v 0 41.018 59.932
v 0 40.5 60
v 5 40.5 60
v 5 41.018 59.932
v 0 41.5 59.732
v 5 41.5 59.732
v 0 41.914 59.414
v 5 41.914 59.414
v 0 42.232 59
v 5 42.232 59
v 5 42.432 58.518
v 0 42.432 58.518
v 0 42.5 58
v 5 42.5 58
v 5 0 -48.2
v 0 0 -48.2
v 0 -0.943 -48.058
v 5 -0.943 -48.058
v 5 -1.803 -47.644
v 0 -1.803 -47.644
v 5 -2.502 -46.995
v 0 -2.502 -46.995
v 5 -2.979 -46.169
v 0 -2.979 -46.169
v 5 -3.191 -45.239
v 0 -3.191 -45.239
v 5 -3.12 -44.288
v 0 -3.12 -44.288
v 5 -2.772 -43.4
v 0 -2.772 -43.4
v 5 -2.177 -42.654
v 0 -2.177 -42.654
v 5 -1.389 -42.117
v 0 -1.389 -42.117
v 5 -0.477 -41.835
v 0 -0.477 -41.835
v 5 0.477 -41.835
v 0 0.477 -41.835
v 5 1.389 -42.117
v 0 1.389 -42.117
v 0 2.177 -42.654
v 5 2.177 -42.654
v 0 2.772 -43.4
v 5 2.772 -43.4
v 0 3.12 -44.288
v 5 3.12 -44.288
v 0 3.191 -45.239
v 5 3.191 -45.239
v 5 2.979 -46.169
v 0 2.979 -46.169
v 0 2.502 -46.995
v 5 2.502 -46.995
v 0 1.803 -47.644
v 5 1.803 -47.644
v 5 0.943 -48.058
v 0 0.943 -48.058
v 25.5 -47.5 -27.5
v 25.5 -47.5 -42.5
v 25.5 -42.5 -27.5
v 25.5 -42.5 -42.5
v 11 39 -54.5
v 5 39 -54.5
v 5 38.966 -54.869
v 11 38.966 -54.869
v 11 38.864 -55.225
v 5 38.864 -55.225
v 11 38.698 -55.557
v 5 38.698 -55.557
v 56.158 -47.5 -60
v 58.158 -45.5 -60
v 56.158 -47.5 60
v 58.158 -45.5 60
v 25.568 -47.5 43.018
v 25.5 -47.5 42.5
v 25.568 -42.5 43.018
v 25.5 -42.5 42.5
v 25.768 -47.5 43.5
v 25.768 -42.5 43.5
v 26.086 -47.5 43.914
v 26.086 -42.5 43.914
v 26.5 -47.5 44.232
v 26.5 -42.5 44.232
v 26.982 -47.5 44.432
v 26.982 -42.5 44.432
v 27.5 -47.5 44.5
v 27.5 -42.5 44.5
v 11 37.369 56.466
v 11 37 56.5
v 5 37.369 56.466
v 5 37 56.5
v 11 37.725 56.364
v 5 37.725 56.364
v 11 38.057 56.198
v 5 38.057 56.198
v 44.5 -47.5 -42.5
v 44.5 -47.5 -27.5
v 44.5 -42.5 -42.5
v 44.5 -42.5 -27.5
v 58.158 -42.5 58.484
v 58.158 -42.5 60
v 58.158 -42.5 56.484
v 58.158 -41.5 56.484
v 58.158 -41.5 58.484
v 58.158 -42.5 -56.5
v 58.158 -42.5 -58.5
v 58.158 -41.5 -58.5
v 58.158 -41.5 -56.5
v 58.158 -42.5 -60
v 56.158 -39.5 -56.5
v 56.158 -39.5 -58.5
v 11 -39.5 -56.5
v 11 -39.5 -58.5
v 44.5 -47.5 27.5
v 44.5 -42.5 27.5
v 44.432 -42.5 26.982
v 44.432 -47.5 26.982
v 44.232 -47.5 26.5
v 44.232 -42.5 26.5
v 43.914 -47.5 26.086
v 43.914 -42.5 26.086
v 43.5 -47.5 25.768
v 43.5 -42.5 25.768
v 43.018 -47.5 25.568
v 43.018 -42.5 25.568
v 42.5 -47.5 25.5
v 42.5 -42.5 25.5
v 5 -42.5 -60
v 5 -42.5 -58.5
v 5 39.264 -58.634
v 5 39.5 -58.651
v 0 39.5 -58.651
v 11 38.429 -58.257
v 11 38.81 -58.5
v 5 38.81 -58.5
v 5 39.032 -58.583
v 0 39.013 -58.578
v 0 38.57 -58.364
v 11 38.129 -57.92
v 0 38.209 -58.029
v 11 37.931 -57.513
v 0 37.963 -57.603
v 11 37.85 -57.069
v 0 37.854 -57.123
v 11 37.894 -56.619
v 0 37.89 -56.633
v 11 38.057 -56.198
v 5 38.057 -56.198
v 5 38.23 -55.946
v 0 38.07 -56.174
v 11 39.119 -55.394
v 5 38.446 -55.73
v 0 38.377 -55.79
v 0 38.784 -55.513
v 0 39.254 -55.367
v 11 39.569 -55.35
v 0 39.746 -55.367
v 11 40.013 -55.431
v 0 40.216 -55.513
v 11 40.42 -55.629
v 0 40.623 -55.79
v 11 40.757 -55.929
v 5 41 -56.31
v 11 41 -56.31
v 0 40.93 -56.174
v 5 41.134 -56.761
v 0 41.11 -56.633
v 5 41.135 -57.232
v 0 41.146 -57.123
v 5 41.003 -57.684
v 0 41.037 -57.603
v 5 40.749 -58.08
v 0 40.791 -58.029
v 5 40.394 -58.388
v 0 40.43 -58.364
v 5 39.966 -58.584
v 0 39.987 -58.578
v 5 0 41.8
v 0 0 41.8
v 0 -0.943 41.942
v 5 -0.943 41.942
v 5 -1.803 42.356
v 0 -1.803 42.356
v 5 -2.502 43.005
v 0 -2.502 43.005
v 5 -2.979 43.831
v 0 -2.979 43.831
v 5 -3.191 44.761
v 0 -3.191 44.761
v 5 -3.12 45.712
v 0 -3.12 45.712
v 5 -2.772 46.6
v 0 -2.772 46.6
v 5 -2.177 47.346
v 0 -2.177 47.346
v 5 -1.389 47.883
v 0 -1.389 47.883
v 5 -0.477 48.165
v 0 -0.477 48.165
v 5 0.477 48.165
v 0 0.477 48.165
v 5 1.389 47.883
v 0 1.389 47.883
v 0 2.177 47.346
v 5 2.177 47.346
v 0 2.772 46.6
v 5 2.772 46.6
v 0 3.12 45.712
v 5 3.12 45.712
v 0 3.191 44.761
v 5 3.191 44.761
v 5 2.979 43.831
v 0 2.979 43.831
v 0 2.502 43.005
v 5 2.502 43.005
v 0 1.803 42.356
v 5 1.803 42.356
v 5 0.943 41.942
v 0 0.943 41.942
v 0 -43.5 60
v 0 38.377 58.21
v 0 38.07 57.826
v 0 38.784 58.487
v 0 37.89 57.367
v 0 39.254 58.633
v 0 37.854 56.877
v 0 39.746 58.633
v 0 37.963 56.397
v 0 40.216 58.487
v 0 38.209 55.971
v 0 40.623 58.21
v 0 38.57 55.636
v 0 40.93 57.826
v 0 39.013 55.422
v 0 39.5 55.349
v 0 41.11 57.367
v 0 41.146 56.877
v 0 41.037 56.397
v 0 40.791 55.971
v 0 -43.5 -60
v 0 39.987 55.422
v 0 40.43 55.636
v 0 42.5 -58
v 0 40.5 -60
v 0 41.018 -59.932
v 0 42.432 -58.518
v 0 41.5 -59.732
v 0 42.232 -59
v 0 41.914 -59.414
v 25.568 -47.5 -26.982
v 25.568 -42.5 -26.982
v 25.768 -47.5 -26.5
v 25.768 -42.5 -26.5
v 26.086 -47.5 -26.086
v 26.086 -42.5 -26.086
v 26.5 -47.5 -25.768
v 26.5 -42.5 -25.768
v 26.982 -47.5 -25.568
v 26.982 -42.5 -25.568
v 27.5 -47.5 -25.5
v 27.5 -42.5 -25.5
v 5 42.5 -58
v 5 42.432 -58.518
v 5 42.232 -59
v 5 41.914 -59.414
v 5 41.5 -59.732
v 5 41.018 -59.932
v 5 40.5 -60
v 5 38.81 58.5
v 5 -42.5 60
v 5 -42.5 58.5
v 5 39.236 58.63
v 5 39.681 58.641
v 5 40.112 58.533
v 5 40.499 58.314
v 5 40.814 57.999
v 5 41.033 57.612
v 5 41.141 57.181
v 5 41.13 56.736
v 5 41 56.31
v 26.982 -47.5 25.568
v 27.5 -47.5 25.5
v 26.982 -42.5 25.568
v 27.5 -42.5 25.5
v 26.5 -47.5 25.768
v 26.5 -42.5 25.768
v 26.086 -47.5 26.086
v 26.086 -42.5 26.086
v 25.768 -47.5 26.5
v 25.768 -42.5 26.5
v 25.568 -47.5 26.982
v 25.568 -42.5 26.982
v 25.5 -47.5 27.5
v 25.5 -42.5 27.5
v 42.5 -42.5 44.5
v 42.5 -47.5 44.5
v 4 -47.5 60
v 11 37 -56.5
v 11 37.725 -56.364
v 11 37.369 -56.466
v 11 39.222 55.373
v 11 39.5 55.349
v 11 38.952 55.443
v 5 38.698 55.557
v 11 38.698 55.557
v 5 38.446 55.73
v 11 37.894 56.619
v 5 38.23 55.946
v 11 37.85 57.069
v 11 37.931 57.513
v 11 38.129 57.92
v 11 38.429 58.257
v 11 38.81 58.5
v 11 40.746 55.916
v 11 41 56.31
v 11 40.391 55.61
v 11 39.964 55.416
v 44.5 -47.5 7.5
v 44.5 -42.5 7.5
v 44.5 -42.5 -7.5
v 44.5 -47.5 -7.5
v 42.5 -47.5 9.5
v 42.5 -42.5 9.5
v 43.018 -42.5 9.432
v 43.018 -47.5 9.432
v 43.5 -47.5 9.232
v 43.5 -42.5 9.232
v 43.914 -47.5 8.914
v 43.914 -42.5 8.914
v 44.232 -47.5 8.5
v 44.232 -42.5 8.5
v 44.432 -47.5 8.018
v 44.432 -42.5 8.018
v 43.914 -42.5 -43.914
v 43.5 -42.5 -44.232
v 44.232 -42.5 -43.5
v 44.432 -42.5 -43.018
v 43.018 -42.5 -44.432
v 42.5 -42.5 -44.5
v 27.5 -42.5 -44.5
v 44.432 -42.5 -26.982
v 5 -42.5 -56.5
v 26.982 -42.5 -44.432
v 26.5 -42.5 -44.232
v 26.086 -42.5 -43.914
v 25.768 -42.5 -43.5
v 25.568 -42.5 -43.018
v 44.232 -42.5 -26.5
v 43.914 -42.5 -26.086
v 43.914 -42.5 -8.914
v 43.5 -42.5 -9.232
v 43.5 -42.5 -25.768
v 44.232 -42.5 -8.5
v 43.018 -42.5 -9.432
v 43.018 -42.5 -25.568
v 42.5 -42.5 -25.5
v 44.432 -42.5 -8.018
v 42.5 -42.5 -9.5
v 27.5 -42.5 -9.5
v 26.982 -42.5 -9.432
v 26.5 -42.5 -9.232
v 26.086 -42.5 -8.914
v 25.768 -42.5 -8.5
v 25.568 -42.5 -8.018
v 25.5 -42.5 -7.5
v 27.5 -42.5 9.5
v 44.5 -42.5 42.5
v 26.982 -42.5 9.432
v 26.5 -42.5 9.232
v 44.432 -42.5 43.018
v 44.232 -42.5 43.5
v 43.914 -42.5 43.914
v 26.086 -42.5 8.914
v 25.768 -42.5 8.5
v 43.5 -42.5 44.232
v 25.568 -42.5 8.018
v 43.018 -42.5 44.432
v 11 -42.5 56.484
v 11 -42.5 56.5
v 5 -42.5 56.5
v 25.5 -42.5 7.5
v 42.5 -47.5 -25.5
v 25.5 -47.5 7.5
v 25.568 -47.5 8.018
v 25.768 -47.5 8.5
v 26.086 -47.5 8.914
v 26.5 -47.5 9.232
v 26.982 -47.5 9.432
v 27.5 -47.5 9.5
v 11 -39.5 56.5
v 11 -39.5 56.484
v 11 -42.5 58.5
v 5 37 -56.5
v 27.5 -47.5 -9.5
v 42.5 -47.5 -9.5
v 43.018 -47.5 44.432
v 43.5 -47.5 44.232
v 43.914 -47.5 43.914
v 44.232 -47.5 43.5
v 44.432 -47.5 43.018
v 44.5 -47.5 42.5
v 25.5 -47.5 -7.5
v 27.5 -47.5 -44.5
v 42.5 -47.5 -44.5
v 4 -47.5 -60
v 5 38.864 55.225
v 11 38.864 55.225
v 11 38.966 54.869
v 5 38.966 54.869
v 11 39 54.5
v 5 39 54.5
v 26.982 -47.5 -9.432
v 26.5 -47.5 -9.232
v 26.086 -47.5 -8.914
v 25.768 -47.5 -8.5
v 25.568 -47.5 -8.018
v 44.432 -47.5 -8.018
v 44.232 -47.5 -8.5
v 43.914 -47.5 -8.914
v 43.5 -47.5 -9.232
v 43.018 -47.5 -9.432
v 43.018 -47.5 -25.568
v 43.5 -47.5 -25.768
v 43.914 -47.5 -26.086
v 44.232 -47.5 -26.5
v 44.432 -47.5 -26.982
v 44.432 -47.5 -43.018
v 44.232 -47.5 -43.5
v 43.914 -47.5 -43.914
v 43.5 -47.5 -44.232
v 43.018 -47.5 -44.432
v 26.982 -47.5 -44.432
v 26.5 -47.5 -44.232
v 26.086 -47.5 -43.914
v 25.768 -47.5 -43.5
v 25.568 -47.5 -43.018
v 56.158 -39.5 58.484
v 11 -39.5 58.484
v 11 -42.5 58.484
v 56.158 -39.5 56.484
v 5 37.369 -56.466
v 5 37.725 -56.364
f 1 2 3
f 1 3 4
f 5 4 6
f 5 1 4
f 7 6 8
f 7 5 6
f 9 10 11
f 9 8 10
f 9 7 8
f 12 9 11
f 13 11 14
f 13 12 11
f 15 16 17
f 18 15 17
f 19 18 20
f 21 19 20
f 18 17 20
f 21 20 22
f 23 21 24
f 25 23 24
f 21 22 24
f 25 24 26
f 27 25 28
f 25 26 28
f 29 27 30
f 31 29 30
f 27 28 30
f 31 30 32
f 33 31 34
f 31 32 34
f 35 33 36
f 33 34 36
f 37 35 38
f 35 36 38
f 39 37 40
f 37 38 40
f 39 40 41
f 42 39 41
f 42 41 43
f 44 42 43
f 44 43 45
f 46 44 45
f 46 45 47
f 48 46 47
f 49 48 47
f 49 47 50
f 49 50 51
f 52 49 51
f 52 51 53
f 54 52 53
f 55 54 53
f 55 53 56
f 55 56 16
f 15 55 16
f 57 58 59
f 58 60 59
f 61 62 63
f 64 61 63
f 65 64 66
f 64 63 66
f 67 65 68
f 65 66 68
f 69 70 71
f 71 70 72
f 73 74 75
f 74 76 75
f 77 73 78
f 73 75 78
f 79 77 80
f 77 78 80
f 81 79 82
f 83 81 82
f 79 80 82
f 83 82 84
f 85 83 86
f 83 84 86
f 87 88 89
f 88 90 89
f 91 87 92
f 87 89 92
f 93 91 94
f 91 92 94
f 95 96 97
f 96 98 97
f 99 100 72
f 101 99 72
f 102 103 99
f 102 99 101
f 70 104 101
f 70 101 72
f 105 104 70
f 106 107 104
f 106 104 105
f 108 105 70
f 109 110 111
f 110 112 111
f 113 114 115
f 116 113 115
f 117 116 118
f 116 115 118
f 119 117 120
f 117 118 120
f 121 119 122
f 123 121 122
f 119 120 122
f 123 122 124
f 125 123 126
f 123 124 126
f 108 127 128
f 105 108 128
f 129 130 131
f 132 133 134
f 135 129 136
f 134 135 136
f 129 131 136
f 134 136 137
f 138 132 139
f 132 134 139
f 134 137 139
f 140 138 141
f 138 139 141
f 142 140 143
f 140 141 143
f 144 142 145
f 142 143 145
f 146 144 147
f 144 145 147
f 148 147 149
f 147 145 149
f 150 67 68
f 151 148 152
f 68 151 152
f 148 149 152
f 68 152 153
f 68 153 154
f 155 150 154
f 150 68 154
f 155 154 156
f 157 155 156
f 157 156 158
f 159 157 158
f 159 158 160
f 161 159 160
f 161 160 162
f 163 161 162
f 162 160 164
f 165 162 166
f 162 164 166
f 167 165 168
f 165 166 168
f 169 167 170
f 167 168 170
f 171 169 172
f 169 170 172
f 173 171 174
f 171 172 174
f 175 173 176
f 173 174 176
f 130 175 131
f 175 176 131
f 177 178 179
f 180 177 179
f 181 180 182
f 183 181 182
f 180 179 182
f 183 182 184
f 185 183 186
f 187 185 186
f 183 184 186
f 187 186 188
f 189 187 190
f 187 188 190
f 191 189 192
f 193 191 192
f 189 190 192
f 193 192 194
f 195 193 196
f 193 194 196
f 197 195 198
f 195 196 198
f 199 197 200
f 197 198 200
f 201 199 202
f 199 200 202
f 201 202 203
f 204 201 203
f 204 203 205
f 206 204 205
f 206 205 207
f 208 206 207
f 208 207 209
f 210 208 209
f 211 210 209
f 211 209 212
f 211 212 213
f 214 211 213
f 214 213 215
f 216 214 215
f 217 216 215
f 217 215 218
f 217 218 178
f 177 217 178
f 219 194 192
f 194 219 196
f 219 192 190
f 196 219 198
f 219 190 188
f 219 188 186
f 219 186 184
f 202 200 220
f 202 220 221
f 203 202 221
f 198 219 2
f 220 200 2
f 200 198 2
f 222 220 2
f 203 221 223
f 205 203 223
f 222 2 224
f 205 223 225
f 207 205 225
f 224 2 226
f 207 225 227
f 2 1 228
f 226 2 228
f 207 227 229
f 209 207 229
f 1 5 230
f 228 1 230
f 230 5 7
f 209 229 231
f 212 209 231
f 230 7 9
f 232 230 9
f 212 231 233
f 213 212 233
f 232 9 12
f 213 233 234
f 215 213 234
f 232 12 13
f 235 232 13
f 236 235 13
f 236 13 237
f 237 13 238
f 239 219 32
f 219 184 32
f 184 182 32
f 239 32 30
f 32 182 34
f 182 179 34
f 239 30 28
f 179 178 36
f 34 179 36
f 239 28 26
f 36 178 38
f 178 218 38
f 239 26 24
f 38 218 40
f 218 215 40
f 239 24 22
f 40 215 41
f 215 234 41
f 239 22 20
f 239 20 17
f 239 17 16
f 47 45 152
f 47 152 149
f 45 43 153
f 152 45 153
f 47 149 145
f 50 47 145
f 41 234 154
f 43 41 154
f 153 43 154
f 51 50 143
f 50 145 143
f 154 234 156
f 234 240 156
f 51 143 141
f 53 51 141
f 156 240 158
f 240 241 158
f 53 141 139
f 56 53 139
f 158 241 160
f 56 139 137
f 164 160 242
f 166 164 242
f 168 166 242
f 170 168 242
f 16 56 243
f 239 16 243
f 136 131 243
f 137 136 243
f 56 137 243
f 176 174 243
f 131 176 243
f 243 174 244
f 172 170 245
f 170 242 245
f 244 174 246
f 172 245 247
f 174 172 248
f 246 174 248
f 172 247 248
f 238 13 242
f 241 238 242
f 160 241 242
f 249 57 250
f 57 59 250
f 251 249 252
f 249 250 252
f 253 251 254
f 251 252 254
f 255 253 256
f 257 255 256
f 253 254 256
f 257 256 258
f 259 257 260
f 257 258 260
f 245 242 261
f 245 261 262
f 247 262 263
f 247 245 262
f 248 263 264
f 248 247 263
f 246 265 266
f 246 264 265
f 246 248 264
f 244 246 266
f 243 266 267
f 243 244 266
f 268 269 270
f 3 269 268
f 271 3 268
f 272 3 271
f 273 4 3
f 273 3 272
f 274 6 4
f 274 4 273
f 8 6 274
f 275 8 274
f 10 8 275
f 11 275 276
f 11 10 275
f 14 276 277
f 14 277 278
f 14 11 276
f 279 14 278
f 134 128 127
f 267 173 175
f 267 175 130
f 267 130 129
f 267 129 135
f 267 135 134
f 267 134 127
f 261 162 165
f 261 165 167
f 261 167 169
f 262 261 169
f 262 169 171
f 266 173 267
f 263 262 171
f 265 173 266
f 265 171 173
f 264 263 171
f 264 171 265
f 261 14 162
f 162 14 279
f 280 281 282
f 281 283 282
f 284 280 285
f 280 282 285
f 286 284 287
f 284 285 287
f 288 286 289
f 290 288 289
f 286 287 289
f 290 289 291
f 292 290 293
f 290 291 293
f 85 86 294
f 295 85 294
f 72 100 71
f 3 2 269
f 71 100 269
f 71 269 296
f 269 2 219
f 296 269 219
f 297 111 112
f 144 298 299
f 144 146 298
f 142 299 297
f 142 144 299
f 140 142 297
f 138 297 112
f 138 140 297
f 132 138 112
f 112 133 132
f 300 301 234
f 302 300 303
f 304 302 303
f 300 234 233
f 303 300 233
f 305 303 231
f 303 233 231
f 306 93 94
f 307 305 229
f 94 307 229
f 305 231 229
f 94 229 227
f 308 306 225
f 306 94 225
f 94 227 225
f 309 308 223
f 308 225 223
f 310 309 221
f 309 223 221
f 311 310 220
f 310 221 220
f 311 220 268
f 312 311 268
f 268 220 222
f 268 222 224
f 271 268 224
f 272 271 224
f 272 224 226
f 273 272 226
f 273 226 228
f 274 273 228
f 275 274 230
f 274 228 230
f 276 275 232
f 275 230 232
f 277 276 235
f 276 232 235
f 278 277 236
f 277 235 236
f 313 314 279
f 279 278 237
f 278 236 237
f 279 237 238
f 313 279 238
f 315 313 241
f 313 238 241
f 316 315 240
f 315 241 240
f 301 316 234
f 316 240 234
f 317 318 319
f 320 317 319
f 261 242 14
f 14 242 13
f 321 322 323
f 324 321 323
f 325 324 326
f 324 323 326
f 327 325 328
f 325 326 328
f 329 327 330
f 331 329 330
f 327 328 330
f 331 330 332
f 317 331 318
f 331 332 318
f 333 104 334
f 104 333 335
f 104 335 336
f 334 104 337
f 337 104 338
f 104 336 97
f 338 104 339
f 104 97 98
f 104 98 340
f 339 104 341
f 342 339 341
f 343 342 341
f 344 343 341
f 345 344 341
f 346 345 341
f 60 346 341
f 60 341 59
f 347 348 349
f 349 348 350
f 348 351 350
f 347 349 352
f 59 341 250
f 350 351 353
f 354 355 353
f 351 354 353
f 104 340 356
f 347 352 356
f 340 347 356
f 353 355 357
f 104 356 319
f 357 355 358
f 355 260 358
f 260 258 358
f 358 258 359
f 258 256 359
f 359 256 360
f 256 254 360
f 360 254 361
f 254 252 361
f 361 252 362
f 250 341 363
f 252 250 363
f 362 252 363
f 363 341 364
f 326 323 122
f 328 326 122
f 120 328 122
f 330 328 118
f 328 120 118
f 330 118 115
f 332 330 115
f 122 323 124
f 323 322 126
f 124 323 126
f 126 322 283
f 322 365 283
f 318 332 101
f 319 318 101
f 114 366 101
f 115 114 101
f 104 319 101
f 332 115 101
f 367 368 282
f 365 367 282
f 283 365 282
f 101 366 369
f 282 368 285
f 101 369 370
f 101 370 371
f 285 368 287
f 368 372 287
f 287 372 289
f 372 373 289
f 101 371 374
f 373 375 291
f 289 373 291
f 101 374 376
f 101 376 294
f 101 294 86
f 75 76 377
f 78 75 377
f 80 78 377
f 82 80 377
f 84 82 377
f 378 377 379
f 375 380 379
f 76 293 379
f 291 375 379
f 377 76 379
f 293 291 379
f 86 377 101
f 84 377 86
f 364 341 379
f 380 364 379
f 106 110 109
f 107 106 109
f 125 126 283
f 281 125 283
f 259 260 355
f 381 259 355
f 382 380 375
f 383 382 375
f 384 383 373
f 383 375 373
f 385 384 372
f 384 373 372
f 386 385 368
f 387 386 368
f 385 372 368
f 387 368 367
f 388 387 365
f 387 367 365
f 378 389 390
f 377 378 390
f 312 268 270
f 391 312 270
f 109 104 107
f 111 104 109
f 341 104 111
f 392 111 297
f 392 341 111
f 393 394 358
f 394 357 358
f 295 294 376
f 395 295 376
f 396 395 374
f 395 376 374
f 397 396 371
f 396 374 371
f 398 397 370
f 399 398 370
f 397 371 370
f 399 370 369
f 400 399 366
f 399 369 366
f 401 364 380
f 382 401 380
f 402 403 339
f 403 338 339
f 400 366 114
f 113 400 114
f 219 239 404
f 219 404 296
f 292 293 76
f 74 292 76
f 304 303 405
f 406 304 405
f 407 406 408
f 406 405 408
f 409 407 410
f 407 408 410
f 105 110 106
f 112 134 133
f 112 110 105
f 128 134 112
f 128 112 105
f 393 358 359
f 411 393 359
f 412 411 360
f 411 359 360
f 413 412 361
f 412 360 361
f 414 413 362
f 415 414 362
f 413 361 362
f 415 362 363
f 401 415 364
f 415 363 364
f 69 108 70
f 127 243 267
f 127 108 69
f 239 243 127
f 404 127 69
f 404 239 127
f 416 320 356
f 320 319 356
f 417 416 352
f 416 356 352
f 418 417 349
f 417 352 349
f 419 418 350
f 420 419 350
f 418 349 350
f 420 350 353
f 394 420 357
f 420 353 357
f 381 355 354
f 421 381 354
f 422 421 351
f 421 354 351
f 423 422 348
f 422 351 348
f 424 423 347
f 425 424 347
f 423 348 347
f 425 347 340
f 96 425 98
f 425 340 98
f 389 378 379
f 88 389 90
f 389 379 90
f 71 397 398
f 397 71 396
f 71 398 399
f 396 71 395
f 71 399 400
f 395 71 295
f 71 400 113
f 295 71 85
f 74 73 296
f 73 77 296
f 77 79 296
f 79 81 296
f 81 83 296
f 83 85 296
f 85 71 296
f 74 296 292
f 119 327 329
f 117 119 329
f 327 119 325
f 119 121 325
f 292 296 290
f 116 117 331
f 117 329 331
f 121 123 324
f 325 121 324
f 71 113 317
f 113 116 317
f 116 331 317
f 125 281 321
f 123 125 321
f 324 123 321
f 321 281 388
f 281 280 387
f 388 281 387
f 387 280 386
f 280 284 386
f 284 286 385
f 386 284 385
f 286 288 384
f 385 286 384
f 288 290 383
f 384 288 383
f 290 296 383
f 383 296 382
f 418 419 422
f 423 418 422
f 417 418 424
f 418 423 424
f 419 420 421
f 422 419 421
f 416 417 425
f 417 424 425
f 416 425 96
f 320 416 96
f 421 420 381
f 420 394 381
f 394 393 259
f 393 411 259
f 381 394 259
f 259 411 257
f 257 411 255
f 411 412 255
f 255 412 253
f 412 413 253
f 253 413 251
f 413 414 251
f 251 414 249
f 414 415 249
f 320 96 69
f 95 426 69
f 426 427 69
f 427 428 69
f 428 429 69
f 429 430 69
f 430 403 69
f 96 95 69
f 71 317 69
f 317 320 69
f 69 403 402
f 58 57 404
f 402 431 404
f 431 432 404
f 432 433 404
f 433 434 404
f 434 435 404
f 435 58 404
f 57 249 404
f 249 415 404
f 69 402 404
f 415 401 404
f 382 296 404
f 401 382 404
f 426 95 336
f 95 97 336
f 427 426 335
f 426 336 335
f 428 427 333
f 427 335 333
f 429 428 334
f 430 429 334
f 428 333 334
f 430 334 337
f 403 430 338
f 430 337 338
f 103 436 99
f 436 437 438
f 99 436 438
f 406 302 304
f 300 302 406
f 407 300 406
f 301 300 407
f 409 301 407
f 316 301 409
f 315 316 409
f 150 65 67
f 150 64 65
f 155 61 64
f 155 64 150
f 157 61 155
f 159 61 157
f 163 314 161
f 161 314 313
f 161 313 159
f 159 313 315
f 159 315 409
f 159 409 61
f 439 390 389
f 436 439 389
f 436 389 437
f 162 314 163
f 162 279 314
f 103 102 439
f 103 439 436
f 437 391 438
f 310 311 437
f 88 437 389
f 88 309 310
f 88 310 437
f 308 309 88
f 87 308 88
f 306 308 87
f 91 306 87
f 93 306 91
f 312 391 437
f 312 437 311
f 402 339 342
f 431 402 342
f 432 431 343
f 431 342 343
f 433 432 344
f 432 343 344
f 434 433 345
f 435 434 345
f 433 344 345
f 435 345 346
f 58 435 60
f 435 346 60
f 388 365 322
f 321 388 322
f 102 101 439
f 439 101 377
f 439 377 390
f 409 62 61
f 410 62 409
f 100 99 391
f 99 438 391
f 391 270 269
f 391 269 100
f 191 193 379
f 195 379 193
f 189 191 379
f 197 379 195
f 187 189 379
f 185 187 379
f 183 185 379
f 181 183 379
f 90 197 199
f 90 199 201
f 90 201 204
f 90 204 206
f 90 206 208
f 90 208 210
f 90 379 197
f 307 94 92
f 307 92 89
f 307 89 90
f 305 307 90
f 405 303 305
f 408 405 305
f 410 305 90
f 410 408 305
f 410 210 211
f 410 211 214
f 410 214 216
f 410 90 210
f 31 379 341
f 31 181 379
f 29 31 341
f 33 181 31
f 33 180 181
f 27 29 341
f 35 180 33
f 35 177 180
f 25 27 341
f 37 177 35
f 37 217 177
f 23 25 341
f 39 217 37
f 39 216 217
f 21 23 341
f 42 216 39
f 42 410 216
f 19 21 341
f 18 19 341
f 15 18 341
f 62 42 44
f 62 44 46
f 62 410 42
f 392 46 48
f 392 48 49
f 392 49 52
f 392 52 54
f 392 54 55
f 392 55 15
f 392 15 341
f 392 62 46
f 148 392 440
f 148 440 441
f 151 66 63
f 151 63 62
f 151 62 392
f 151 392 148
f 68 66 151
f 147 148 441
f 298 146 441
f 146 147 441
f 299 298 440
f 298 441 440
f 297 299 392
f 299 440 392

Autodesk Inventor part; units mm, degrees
ref_plane "YZ Plane" through (0, 0, 0) normal (1, 0, 0) x (0, 1, 0)
ref_plane "XZ Plane" through (0, 0, 0) normal (0, 1, 0) x (-1, 0, 0)
ref_plane "XY Plane" through (0, 0, 0) normal (0, 0, 1) x (1, 0, 0)
sketch "Esboço1" plane through (0, 0, 0) normal (1, 0, 0) x (0, 1, 0)
  line L0 (40.5, 60) -> (-42.5, 60)
  line L1 (-42.5, 60) -> (-42.5, -60)
  line L2 (-42.5, -60) -> (40.5, -60)
  line L3 (42.5, -58) -> (42.5, 58)
  line L4 (-42.5, 60) -> (42.5, -60) construction
  arc A0 (42.5, 58) -> (40.5, 60) centre (40.5, 58) ccw
  arc A1 (40.5, -60) -> (42.5, -58) centre (40.5, -58) ccw
  point P0 (0, 0)
  dimension "d0" = 85
  dimension "d1" = 120
  dimension "d4" = 2
extrude "Extrusão1" add sketch "Esboço1" along normal blind 5
sketch "Esboço2" plane through (5, 0, 0) normal (1, 0, 0) x (0, 0, -1)
  line L0 (-60, 40.5) -> (-60, -42.5) projected
  line L1 (-60, -42.5) -> (-58.5, -42.5)
  line L2 (-60, -42.5) -> (60, -42.5) projected
  line L3 (60, -42.5) -> (58.5, -42.5)
  arc A0 (-58, 42.5) -> (-60, 40.5) centre (-58, 40.5) ccw projected
  line L4 (-58, 42.5) -> (-58, 41)
  line L5 (-58.5, -42.5) -> (-56.5, -42.5)
  line L6 (-56.5, -42.5) -> (-56.5, 37)
  line L7 (-56.5, 41) -> (-56.5, 41)
  line L8 (-58.5, 39) -> (-58.5, -42.5)
  line L9 (58.5, -42.5) -> (56.5, -42.5)
  line L10 (56.5, -42.5) -> (56.5, 37)
  line L11 (56.5, 41) -> (56.5, 41)
  line L12 (58.5, 39) -> (58.5, -42.5)
  line L13 (-56.5, 41) -> (56.5, 41)
  line L14 (54.5, 39) -> (-54.5, 39)
  arc A1 (-56.5, 41) -> (-58.5, 39) centre (-56.5, 39) ccw
  arc A2 (-54.5, 39) -> (-56.5, 37) centre (-54.5, 37) ccw
  arc A3 (58.5, 39) -> (56.5, 41) centre (56.5, 39) ccw
  arc A4 (56.5, 37) -> (54.5, 39) centre (54.5, 37) ccw
  point P0 (0, 0)
  point P1 (-58.5, 41)
  point P2 (58.5, 41)
  dimension "d7" = 1.5
  dimension "d8" = 1.5
  dimension "d9" = 1.5
  dimension "d10" = 2
  dimension "d11" = 2
  dimension "d13" = 2
extrude "Extrusão2" add sketch "Esboço2" along normal blind 6 contours L8 A1 L13 A3 L12 L2 L10 A4 L14 A2 L6
sketch "Esboço3" plane through (11, 0, 0) normal (1, 0, 0) x (0, 0, -1)
  circle A0 centre (-57, 39.5) radius 1.6
  circle A1 centre (57, 39.5) radius 1.6
  point P0 (0, 0)
  dimension "d18" = 3.2
hole "Furo1" at (11, 39.5, 57) direction (-1, 0, 0) diameter 3.302 depth 40 tip angle 118 thread size "8-32 UNC" class "2B" standard "ANSI Unified Screw Threads"
hole "Furo2" at (11, 39.5, -57) direction (-1, 0, 0) diameter 3.302 depth 40 tip angle 118 thread size "8-32 UNC" class "2B" standard "ANSI Unified Screw Threads"
sketch "Esboço4" plane through (5, 0, 0) normal (1, 0, 0) x (0, 0, -1)
  line L0 (-60, -42.5) -> (60, -42.5) projected
  line L1 (-60, -42.5) -> (60, -42.5)
  line L2 (60, -42.5) -> (60, -47.5)
  line L3 (60, -47.5) -> (-60, -47.5)
  line L4 (-60, -47.5) -> (-60, -42.5)
  point P0 (0, 0)
  point P1 (60, -42.5)
  dimension "d33" = 5
extrude "Extrusão3" add sketch "Esboço4" against normal blind 5
sketch "Esboço5" plane through (5, 0, 0) normal (1, 0, 0) x (0, 0, -1)
  line L0 (-60, 40.5) -> (-60, -47.5) projected
  line L1 (60, 40.5) -> (60, -47.5) projected
  line L2 (-60, -47.5) -> (60, -47.5)
  line L3 (60, -47.5) -> (60, -42.5)
  line L4 (60, -42.5) -> (-60, -42.5)
  line L5 (-60, -42.5) -> (-60, -47.5)
  point P0 (0, 0)
  point P1 (60, -47.5)
  dimension "d36" = 5
extrude "Extrusão4" add sketch "Esboço5" along normal blind 53.158
sketch "Esboço6" plane through (11, 0, 0) normal (1, 0, 0) x (0, 0, -1)
  line L0 (60, -42.5) -> (-60, -42.5) projected
  line L1 (-58.4844, -42.5) -> (-56.4844, -42.5)
  line L2 (-56.4844, -42.5) -> (-56.4844, -39.5)
  line L3 (-56.4844, -39.5) -> (-58.4844, -39.5)
  line L4 (-58.4844, -39.5) -> (-58.4844, -42.5)
  line L5 (56.5, 37) -> (56.5, -42.5) projected
  line L6 (58.5, 38.8102) -> (58.5, -42.5) projected
  line L7 (56.5, -42.5) -> (58.5, -42.5)
  line L8 (58.5, -42.5) -> (58.5, -39.5)
  line L9 (58.5, -39.5) -> (56.5, -39.5)
  line L10 (56.5, -39.5) -> (56.5, -42.5)
  point P0 (0, 0)
  dimension "d39" = 2
  dimension "d40" = 3
  dimension "d41" = 3
extrude "Extrusão5" add sketch "Esboço6" along normal blind 47.158
chamfer "Chanfro1" distance 2 angle 45 2 edges at (58.158, -39.5, 57.4844) (58.158, -39.5, -57.5)
chamfer "Chanfro2" distance 4 angle 45 1 edges at (0, -47.5, 0)
chamfer "Chanfro3" distance 2 angle 45 1 edges at (58.158, -47.5, 0)
sketch "Esboço7" plane through (5, 0, 0) normal (1, 0, 0) x (0, 0, -1)
  circle A0 centre (-45, 0) radius 3
  circle A1 centre (45, 0) radius 3
  point P0 (0, 0)
  dimension "d61" = 6
  dimension "d62" = 6
hole "Furo3" at (5, 0, 45) direction (-1, 0, 0) diameter 6.4008 depth 22.931 tip angle 118 thread size "5/16-18 UNC" class "2B" standard "ANSI Unified Screw Threads"
hole "Furo4" at (5, 0, -45) direction (-1, 0, 0) diameter 6.4008 depth 22.931 tip angle 118 thread size "5/16-18 UNC" class "2B" standard "ANSI Unified Screw Threads"
sketch "Esboço8" plane through (5, -42.5, 56.5) normal (0, 1, 0) x (1, 0, 0)
  line L0 (0, 0) -> (0, 113) projected
  line L1 (0, 0) -> (30, 0)
  line L2 (0, 56.5) -> (0, 0)
  line L3 (22.5, 47) -> (37.5, 47)
  line L4 (39.5, 49) -> (39.5, 64)
  line L5 (37.5, 66) -> (22.5, 66)
  line L6 (20.5, 64) -> (20.5, 49)
  line L7 (20.5, 47) -> (39.5, 66) construction
  line L8 (39.5, 47) -> (20.5, 66) construction
  line L9 (22.5, 12) -> (37.5, 12)
  line L10 (39.5, 14) -> (39.5, 29)
  line L11 (37.5, 31) -> (22.5, 31)
  line L12 (20.5, 29) -> (20.5, 14)
  line L13 (20.5, 12) -> (39.5, 31) construction
  line L14 (39.5, 12) -> (20.5, 31) construction
  line L15 (22.5, 82) -> (37.5, 82)
  line L16 (39.5, 84) -> (39.5, 99)
  line L17 (37.5, 101) -> (22.5, 101)
  line L18 (20.5, 99) -> (20.5, 84)
  line L19 (20.5, 82) -> (39.5, 101) construction
  line L20 (39.5, 82) -> (20.5, 101) construction
  arc A0 (20.5, 14) -> (22.5, 12) centre (22.5, 14) ccw
  arc A1 (22.5, 31) -> (20.5, 29) centre (22.5, 29) ccw
  arc A2 (39.5, 29) -> (37.5, 31) centre (37.5, 29) ccw
  arc A3 (37.5, 12) -> (39.5, 14) centre (37.5, 14) ccw
  arc A4 (37.5, 47) -> (39.5, 49) centre (37.5, 49) ccw
  arc A5 (39.5, 64) -> (37.5, 66) centre (37.5, 64) ccw
  arc A6 (22.5, 66) -> (20.5, 64) centre (22.5, 64) ccw
  arc A7 (20.5, 49) -> (22.5, 47) centre (22.5, 49) ccw
  arc A8 (22.5, 101) -> (20.5, 99) centre (22.5, 99) ccw
  arc A9 (39.5, 99) -> (37.5, 101) centre (37.5, 99) ccw
  arc A10 (20.5, 84) -> (22.5, 82) centre (22.5, 84) ccw
  arc A11 (37.5, 82) -> (39.5, 84) centre (37.5, 84) ccw
  point P0 (-5, 56.5)
  dimension "d82" = 19
  dimension "d83" = 19
  dimension "d88" = 19
  dimension "d89" = 19
  dimension "d91" = 19
  dimension "d92" = 19
  dimension "d93" = 2
  dimension "d94" = 2
extrude "Extrusão6" cut sketch "Esboço8" against normal through all
properties part number "sUPORTE"
